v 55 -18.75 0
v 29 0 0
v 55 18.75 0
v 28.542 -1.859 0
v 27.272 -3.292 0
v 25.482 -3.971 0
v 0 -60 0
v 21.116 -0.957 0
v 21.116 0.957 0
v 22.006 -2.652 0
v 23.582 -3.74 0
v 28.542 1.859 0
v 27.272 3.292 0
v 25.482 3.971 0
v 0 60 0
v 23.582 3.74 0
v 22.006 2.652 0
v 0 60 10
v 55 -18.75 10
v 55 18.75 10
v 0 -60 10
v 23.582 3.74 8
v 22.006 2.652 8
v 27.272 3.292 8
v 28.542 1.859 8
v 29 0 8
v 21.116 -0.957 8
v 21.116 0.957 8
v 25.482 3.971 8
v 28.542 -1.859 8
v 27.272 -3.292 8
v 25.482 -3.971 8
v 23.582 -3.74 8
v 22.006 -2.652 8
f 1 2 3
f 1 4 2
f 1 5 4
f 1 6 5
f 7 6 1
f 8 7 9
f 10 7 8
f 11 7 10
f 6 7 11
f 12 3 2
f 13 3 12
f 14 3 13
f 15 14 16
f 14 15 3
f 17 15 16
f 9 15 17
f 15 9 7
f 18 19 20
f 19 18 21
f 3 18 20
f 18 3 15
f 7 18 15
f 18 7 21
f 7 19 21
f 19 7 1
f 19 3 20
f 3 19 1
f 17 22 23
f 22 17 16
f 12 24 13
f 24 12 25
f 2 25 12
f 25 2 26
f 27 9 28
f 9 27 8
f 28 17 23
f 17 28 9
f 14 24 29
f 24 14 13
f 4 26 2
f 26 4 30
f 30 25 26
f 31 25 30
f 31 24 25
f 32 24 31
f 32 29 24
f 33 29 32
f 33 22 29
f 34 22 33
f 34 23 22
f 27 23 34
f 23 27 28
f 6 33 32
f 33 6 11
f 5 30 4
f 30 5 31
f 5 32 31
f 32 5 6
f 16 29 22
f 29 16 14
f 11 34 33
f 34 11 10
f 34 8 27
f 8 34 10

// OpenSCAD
module triangle(o_len, a_len, depth)
{
    linear_extrude(height=depth)
    {
        polygon(points=[[0,0],[a_len,0],[0,o_len]], paths=[[0,1,2]]);
    }
}


difference() {
    
    
     equalateral();
    
    
    cutaway();

}

module equalateral() {
        triangle(60, 80, 10);

        mirror([0,90,0]) {
            triangle(60, 80, 10);
        }
    }
    
    module cutaway() {
     translate([70, 0, 5]) {
        cube([30, 50, 12], true);
    }
    
    translate([25,0,3]) {
        cylinder(10,4,4, true);
    }
   }
